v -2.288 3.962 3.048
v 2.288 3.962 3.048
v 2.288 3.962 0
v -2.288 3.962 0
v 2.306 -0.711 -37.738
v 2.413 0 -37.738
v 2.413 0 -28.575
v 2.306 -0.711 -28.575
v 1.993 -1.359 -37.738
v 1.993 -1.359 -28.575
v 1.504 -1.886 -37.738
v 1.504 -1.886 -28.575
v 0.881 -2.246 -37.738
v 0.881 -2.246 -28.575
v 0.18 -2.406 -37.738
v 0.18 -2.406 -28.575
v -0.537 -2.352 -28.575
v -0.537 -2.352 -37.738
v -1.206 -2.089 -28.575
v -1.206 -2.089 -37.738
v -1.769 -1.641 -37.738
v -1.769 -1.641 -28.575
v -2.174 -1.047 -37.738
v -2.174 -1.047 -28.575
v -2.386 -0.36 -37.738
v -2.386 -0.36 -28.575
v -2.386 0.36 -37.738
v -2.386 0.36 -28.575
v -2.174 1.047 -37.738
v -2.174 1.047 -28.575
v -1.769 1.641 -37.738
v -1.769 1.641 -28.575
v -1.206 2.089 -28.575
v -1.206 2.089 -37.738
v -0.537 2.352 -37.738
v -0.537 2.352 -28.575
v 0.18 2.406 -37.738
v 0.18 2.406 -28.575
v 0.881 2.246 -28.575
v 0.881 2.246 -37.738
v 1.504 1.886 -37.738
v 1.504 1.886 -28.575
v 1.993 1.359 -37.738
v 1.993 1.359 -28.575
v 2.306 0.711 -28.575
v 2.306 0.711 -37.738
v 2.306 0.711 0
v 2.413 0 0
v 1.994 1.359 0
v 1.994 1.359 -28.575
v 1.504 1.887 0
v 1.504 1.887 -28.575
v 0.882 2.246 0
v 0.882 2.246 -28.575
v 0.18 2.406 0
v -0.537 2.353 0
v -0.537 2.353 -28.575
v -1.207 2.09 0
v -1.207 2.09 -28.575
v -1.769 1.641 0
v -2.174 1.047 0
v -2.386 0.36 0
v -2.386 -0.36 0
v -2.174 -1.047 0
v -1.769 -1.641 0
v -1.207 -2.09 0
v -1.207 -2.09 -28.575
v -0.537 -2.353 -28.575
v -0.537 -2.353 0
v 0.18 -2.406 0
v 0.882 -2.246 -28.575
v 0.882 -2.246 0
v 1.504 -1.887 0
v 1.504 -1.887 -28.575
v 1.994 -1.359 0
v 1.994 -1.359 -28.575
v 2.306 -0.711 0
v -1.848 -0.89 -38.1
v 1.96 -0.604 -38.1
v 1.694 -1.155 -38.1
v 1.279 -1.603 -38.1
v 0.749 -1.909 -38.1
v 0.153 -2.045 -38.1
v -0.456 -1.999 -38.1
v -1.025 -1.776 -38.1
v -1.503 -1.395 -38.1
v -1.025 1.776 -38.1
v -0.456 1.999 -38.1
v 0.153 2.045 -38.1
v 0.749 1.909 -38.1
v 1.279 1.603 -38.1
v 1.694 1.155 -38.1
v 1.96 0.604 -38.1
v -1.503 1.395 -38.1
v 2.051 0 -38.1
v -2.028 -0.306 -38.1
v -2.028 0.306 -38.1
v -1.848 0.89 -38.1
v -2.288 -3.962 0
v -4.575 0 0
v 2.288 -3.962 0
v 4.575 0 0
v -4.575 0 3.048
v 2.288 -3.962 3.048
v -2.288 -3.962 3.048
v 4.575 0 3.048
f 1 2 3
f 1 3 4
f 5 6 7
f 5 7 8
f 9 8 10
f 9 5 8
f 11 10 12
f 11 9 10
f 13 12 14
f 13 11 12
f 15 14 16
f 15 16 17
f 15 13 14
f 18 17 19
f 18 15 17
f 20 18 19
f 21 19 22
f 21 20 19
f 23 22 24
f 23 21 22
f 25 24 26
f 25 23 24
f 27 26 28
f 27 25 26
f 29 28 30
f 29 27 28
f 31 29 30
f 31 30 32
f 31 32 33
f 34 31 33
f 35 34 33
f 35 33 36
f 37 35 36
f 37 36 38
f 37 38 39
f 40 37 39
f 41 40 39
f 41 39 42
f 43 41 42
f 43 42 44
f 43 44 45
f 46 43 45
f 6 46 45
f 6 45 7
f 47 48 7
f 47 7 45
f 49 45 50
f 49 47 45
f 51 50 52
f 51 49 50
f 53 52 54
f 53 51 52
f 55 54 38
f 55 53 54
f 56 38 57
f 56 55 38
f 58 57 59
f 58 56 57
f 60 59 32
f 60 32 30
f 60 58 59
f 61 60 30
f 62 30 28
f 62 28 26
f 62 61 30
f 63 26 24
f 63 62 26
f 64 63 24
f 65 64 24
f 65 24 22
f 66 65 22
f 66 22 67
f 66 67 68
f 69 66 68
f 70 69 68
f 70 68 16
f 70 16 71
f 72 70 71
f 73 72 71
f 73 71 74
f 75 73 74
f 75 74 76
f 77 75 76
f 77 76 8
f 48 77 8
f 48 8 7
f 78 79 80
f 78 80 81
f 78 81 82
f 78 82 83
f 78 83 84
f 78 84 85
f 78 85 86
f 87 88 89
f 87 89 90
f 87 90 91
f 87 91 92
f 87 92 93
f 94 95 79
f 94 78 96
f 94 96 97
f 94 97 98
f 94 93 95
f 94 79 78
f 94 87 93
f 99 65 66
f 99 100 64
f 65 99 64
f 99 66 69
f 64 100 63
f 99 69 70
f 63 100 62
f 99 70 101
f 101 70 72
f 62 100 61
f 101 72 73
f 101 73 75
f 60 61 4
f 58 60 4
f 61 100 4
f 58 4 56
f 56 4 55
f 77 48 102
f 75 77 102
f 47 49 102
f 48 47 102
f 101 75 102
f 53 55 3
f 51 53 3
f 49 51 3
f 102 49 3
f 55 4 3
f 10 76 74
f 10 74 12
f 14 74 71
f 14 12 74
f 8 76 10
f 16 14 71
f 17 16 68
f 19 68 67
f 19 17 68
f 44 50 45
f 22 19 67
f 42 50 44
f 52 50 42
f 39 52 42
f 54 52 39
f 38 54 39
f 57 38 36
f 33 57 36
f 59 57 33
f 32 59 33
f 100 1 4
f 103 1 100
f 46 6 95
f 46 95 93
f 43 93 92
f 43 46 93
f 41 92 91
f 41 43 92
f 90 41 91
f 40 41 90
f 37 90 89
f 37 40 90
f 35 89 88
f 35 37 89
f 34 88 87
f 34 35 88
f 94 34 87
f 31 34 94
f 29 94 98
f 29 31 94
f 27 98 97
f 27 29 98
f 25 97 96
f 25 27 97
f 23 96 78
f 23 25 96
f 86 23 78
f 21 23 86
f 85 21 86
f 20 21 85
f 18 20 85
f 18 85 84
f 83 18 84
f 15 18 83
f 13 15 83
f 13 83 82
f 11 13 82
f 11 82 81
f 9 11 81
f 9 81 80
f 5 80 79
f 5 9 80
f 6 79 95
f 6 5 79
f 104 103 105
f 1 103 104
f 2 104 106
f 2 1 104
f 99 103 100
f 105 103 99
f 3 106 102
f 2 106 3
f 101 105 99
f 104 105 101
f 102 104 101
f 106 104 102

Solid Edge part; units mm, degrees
sketch "Sketch1" plane through (0, 0, 0) normal (0, 0, 1) x (1, 0, 0)
  circle A0 centre (0, 0) radius 4.5964
  dimension "D1" = 9.1928
extrude "Protrusion1" add sketch "Sketch1" along normal blind 3.048
sketch "Sketch2" plane through (0, 0, 0) normal (0, 0, -1) x (1, 0, 0)
  circle A0 centre (0, 0) radius 2.413
extrude "Protrusion2" add sketch "Sketch2" along normal blind 38.1
sketch "Sketch3" plane through (0, 0, -38.1) normal (0, 0, -1) x (1, 0, 0)
  circle A0 centre (0, 0) radius 2.4127
extrude "Cutout1" cut sketch "Sketch3" against normal blind 9.525 flip side to cut
chamfer "Chamfer_1" distance 0.3619 angle 45 1 edges at (-2.4127, 0, -38.1)
sketch "Sketch4" plane through (0, 0, 3.048) normal (0, 0, 1) x (1, 0, 0)
  line L0 (-2.3294, 3.9624) -> (2.3294, 3.9624)
  dimension "D1" = 7.9248
extrude "Cutout2" cut sketch "Sketch4" against normal up to next material side at (0, 4.0124, 3.048)
pattern_circular "Pattern1" count 6 over 360 about axis through (0, 0, 3.048) along (0, 0, 1) of "Cutout2"
properties part number "185522"
